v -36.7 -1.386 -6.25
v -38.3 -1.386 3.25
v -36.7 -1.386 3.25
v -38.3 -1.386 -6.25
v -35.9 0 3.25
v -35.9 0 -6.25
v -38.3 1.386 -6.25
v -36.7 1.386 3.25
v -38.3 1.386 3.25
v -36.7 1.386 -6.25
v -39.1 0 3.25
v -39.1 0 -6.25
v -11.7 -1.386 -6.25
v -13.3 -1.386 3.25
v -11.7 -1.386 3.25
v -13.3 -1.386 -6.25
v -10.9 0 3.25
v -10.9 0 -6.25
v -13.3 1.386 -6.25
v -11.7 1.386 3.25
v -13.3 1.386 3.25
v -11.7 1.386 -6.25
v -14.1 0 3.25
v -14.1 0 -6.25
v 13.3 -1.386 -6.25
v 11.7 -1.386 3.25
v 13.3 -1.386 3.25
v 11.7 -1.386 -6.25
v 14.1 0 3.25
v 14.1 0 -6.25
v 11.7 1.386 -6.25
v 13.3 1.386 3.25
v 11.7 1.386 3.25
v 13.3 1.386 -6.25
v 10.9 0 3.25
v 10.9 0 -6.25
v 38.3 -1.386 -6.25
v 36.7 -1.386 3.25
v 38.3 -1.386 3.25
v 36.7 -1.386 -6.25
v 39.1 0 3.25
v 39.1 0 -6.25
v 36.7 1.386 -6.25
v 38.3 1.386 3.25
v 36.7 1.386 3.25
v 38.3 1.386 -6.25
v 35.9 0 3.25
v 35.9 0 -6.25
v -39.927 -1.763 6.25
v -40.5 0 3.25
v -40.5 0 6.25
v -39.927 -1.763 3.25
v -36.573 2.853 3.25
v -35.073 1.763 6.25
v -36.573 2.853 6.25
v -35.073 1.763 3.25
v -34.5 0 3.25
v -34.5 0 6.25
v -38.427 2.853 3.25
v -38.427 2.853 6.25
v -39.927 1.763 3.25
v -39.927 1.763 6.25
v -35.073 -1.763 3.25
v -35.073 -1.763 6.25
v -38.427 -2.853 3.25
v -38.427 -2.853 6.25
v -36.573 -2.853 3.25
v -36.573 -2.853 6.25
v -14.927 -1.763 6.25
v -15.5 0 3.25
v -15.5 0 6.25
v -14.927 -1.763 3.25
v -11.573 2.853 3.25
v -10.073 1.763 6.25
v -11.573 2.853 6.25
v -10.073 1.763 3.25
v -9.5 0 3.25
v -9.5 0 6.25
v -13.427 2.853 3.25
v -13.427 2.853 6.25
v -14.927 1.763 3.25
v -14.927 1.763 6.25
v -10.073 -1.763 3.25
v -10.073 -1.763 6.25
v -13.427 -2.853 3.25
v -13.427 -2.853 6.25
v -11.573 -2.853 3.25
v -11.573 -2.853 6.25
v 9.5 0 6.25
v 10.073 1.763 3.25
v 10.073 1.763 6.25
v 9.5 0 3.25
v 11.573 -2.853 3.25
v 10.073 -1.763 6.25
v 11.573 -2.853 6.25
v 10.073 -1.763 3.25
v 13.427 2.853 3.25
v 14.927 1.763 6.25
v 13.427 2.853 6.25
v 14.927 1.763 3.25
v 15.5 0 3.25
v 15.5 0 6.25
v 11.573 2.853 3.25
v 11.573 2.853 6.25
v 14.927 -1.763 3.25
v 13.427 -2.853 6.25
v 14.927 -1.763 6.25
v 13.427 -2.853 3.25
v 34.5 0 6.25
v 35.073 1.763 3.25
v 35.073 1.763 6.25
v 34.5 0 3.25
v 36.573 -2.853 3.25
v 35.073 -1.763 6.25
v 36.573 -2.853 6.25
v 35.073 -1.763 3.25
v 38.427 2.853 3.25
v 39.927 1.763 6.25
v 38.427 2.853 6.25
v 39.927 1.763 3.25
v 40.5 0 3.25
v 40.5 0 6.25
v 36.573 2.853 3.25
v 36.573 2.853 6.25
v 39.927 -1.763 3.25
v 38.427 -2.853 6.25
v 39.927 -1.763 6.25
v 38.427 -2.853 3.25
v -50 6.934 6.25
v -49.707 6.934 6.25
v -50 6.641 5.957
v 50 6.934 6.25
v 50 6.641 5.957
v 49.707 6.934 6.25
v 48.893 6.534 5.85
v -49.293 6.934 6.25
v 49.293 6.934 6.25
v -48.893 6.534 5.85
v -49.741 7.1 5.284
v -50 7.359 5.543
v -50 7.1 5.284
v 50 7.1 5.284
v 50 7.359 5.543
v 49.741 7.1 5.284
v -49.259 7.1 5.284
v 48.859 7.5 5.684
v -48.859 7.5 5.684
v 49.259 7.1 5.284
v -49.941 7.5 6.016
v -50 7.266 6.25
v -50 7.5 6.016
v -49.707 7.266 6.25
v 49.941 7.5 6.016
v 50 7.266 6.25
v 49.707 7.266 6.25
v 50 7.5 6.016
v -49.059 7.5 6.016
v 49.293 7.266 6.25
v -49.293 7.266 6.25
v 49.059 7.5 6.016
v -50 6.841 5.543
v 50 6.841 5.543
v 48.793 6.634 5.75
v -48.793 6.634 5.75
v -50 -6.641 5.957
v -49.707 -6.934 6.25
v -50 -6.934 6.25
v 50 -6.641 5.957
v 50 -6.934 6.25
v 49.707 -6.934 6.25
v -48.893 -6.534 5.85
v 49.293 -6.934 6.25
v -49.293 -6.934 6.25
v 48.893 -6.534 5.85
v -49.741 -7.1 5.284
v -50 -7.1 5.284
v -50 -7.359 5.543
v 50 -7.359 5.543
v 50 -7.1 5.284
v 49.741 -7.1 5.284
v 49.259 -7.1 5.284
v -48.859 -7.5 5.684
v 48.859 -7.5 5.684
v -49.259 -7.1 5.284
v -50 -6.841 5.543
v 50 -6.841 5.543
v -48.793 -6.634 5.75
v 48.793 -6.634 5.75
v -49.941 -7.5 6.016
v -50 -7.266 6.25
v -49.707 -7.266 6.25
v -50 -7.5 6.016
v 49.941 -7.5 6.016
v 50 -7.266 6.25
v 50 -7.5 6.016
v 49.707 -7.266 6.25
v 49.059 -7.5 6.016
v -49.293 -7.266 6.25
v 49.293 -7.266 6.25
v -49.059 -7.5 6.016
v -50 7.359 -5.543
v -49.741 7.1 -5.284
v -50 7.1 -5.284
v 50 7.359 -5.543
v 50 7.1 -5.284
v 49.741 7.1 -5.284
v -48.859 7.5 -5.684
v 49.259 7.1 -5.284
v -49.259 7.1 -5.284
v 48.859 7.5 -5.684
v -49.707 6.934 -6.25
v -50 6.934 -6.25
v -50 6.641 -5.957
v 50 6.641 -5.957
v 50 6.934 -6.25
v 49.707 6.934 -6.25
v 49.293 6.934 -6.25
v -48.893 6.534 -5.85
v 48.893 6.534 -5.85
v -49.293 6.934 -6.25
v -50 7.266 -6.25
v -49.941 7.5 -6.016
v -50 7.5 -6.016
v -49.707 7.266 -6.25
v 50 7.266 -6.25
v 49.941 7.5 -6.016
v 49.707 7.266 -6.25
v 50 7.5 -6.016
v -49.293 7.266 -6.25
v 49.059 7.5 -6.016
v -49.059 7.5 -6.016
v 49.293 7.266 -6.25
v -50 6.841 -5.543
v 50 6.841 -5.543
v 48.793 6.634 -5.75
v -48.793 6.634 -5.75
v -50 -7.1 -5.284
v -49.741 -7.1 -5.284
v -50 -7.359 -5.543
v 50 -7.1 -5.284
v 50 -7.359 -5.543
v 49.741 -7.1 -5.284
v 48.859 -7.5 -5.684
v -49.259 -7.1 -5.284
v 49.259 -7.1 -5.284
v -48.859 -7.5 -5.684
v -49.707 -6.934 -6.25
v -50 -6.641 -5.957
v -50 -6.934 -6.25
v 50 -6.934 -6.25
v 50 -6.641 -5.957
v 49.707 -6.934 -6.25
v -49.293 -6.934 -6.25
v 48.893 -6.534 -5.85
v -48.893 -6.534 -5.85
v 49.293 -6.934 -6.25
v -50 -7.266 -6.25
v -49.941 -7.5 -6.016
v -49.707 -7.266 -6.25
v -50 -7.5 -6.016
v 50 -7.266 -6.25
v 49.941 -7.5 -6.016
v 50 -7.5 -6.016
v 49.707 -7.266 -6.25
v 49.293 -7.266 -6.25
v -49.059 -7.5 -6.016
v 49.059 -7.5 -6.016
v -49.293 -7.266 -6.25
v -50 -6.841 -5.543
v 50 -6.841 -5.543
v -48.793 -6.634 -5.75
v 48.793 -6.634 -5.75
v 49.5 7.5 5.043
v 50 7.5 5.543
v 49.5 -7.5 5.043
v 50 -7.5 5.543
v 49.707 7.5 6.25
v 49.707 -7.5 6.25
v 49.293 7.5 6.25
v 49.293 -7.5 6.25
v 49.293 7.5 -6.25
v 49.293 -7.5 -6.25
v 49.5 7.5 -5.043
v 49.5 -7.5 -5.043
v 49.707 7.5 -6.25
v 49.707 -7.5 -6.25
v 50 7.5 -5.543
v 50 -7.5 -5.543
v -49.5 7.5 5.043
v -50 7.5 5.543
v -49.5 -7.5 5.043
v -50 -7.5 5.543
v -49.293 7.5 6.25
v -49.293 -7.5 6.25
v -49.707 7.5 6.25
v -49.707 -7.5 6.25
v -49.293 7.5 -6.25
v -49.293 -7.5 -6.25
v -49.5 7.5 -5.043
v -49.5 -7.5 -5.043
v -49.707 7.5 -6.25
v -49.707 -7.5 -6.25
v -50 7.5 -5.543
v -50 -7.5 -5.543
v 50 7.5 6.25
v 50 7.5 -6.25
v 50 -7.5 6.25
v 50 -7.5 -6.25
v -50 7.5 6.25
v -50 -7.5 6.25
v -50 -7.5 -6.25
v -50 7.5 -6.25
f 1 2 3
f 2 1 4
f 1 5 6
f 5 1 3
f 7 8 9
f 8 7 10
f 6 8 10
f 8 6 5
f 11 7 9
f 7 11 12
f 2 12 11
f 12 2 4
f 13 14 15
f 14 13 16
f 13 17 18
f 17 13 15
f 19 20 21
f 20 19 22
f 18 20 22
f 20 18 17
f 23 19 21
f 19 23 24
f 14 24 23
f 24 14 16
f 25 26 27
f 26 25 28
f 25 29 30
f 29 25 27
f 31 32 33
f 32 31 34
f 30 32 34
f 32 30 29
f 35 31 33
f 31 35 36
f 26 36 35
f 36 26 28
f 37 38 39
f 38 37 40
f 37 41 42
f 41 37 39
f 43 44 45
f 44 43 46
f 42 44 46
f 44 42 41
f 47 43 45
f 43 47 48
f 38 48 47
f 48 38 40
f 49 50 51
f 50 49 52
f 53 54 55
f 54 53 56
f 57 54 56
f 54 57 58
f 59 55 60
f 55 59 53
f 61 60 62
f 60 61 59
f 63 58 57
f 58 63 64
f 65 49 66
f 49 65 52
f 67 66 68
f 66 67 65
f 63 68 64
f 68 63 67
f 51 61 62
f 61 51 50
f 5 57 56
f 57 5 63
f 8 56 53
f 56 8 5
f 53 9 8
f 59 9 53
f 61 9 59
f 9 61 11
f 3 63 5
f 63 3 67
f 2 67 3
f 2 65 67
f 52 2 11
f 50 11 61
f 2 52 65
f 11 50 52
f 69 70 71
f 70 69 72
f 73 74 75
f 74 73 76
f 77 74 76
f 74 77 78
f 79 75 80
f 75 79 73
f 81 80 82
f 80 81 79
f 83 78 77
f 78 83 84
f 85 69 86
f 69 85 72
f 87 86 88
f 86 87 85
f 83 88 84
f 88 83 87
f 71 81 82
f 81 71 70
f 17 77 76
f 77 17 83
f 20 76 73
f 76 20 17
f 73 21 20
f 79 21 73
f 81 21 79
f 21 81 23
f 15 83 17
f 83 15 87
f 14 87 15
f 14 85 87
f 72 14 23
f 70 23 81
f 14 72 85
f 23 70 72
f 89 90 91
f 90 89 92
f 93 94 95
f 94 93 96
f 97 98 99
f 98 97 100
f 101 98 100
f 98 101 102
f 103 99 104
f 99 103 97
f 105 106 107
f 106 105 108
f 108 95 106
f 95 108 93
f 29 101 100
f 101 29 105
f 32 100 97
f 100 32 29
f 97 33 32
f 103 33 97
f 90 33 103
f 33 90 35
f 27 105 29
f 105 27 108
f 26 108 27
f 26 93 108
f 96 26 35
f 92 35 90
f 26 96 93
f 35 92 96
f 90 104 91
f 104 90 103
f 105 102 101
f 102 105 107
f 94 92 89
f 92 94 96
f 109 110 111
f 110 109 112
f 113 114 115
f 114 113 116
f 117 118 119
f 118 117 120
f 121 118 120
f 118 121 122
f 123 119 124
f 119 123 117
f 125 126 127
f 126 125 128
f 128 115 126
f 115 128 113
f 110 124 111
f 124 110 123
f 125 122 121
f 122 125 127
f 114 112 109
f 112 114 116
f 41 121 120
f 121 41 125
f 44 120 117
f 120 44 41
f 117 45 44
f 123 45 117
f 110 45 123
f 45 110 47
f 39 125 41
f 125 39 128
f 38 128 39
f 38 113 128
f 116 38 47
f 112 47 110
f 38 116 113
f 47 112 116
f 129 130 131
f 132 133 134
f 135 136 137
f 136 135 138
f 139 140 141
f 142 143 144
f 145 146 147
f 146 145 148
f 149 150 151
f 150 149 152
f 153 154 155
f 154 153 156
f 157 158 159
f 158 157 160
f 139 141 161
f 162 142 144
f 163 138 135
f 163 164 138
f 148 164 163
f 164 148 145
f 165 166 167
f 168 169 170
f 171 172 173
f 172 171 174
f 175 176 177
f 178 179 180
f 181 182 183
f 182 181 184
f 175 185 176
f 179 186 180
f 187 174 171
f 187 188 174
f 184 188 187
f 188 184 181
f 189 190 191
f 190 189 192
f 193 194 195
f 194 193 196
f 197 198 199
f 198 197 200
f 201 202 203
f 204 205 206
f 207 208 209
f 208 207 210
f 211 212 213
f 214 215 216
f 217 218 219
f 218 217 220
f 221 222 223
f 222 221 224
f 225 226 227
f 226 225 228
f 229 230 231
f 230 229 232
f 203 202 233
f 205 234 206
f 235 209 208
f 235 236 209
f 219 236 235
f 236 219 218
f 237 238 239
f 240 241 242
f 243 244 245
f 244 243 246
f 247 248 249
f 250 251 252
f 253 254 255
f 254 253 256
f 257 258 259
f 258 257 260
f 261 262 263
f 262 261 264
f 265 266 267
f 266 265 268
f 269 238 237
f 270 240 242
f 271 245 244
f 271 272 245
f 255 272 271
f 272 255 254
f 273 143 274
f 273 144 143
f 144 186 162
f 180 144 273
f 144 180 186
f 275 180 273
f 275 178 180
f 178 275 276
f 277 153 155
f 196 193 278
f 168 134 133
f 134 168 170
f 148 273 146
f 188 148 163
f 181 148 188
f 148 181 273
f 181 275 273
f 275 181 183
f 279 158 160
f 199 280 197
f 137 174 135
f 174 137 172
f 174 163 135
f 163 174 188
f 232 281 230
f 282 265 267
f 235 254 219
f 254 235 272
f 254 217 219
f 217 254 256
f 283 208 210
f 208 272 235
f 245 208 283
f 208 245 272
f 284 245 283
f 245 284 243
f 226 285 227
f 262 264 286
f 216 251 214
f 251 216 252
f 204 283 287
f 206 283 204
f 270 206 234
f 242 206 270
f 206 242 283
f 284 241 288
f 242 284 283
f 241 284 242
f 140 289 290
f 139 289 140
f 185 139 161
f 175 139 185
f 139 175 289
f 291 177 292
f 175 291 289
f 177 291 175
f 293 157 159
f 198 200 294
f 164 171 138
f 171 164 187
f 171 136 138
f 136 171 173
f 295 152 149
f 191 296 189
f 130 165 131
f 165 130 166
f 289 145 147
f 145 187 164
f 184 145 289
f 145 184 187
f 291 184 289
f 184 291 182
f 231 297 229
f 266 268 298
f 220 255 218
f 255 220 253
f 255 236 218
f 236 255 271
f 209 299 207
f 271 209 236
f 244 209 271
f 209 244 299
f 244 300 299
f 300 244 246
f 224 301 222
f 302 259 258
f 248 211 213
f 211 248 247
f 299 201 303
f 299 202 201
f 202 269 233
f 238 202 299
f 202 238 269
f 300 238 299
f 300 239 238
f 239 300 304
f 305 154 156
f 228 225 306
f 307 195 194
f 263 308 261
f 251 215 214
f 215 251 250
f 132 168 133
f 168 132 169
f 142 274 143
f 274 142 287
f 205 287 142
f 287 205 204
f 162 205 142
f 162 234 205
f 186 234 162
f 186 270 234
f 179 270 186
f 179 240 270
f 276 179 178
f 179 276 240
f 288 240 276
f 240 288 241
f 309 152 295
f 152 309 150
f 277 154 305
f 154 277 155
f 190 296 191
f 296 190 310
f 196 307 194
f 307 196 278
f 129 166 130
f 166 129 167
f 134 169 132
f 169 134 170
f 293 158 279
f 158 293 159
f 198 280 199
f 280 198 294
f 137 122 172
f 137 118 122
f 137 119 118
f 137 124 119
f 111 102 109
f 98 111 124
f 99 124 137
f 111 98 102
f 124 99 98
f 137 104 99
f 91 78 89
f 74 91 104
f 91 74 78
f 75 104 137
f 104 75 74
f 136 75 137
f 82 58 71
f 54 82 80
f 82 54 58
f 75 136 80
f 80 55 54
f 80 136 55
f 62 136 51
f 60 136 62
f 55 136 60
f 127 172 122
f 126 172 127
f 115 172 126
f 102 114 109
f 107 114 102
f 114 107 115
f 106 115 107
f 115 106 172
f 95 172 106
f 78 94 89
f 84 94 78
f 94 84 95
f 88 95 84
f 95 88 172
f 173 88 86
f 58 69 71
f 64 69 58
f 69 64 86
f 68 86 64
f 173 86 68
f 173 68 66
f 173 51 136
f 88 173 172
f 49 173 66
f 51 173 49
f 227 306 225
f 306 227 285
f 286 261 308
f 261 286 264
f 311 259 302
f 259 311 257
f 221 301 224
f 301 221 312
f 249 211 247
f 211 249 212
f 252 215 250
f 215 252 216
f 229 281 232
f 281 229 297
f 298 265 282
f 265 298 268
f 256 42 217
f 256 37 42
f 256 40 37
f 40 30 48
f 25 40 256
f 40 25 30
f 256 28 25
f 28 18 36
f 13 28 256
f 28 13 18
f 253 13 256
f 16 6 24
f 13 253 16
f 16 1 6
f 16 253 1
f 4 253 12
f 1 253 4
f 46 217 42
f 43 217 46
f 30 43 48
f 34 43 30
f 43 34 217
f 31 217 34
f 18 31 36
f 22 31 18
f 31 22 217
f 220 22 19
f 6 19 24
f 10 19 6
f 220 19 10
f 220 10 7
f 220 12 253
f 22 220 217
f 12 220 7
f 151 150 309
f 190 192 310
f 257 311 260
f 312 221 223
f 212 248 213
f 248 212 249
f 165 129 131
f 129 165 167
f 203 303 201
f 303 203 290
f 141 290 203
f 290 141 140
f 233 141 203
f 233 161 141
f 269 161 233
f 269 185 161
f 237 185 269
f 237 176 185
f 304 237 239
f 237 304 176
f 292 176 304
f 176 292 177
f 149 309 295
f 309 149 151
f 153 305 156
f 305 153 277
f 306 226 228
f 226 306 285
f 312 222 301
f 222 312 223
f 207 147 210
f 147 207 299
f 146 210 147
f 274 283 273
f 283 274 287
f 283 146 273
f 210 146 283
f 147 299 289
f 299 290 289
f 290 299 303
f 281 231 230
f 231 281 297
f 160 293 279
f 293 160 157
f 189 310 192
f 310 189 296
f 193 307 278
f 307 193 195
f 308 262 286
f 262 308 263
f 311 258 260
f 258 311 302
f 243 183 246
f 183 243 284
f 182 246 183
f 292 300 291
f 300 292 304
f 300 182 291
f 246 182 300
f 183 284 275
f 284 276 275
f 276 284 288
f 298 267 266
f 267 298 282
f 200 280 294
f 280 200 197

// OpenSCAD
// Parameters
rail_L = 100.0; //[50.0:200.0:1.0]
rail_W = 15.0; //[7.5:30.0:0.5]
rail_H = 12.5; //[6.25:25.0:0.5]
hole_d = 3.2; //[1.6:6.4:0.1]
hole_pitch = 25.0; //[12.5:50.0:0.5]
hole_edge_offset = 7.5; //[3.75:15.0:0.5]
hole_end_offset = 12.5; //[6.25:25.0:0.5]
hole_count = 4; //[2:10:1]
counterbore_d = 6.0; //[4.0:12.0:0.1]
counterbore_depth = 2.5; //[1.0:6.0:0.1]
edge_chamfer = 0.8; //[0.2:2.0:0.1]
end_chamfer = 1.0; //[0.2:3.0:0.1]
overlap = 1.0; //[0.5:2.0:0.1]

// Base Shapes
module rail_body() {
  color("Silver")
  translate([0, 0, 0])
    cube([rail_L, rail_W, rail_H], center=true);
}

module mount_hole(x_offset) {
  translate([x_offset, hole_edge_offset - rail_W/2, 0])
    cylinder(h=rail_H + 2*overlap, r=hole_d/2, center=true);
}

module counterbore(x_offset) {
  translate([x_offset, hole_edge_offset - rail_W/2, rail_H/2 - counterbore_depth/2])
    cylinder(h=counterbore_depth + overlap, r=counterbore_d/2, center=true);
}

module edge_chamfer_cut_ypos() {
  translate([0, rail_W/2 - edge_chamfer/2, rail_H/2 - edge_chamfer/2])
    rotate([45, 0, 0])
      cube([rail_L + 2*overlap, edge_chamfer, edge_chamfer], center=true);
}

module edge_chamfer_cut_yneg() {
  translate([0, -rail_W/2 + edge_chamfer/2, rail_H/2 - edge_chamfer/2])
    rotate([-45, 0, 0])
      cube([rail_L + 2*overlap, edge_chamfer, edge_chamfer], center=true);
}

module edge_chamfer_cut_zneg_ypos() {
  translate([0, rail_W/2 - edge_chamfer/2, -rail_H/2 + edge_chamfer/2])
    rotate([-45, 0, 0])
      cube([rail_L + 2*overlap, edge_chamfer, edge_chamfer], center=true);
}

module edge_chamfer_cut_zneg_yneg() {
  translate([0, -rail_W/2 + edge_chamfer/2, -rail_H/2 + edge_chamfer/2])
    rotate([45, 0, 0])
      cube([rail_L + 2*overlap, edge_chamfer, edge_chamfer], center=true);
}

module end_chamfer_cut_xpos_ypos() {
  translate([rail_L/2 - end_chamfer/2, 0, rail_H/2 - end_chamfer/2])
    rotate([0, 45, 0])
      cube([end_chamfer, rail_W + 2*overlap, end_chamfer], center=true);
}

module end_chamfer_cut_xpos_yneg() {
  translate([rail_L/2 - end_chamfer/2, 0, -rail_H/2 + end_chamfer/2])
    rotate([0, -45, 0])
      cube([end_chamfer, rail_W + 2*overlap, end_chamfer], center=true);
}

module end_chamfer_cut_xneg_ypos() {
  translate([-rail_L/2 + end_chamfer/2, 0, rail_H/2 - end_chamfer/2])
    rotate([0, -45, 0])
      cube([end_chamfer, rail_W + 2*overlap, end_chamfer], center=true);
}

module end_chamfer_cut_xneg_yneg() {
  translate([-rail_L/2 + end_chamfer/2, 0, -rail_H/2 + end_chamfer/2])
    rotate([0, 45, 0])
      cube([end_chamfer, rail_W + 2*overlap, end_chamfer], center=true);
}

// Operations
module mounting_holes_pattern() {
  union() {
    for (i = [0:hole_count-1]) {
      mount_hole(-rail_L/2 + hole_end_offset + i*hole_pitch);
    }
  }
}

module counterbores_or_countersinks() {
  union() {
    for (i = [0:hole_count-1]) {
      counterbore(-rail_L/2 + hole_end_offset + i*hole_pitch);
    }
  }
}

module edge_chamfers() {
  union() {
    edge_chamfer_cut_ypos();
    edge_chamfer_cut_yneg();
    edge_chamfer_cut_zneg_ypos();
    edge_chamfer_cut_zneg_yneg();
  }
}

module end_chamfers() {
  union() {
    end_chamfer_cut_xpos_ypos();
    end_chamfer_cut_xpos_yneg();
    end_chamfer_cut_xneg_ypos();
    end_chamfer_cut_xneg_yneg();
  }
}

// Final Model
difference() {
  rail_body();
  mounting_holes_pattern();
  counterbores_or_countersinks();
  edge_chamfers();
  end_chamfers();
}
